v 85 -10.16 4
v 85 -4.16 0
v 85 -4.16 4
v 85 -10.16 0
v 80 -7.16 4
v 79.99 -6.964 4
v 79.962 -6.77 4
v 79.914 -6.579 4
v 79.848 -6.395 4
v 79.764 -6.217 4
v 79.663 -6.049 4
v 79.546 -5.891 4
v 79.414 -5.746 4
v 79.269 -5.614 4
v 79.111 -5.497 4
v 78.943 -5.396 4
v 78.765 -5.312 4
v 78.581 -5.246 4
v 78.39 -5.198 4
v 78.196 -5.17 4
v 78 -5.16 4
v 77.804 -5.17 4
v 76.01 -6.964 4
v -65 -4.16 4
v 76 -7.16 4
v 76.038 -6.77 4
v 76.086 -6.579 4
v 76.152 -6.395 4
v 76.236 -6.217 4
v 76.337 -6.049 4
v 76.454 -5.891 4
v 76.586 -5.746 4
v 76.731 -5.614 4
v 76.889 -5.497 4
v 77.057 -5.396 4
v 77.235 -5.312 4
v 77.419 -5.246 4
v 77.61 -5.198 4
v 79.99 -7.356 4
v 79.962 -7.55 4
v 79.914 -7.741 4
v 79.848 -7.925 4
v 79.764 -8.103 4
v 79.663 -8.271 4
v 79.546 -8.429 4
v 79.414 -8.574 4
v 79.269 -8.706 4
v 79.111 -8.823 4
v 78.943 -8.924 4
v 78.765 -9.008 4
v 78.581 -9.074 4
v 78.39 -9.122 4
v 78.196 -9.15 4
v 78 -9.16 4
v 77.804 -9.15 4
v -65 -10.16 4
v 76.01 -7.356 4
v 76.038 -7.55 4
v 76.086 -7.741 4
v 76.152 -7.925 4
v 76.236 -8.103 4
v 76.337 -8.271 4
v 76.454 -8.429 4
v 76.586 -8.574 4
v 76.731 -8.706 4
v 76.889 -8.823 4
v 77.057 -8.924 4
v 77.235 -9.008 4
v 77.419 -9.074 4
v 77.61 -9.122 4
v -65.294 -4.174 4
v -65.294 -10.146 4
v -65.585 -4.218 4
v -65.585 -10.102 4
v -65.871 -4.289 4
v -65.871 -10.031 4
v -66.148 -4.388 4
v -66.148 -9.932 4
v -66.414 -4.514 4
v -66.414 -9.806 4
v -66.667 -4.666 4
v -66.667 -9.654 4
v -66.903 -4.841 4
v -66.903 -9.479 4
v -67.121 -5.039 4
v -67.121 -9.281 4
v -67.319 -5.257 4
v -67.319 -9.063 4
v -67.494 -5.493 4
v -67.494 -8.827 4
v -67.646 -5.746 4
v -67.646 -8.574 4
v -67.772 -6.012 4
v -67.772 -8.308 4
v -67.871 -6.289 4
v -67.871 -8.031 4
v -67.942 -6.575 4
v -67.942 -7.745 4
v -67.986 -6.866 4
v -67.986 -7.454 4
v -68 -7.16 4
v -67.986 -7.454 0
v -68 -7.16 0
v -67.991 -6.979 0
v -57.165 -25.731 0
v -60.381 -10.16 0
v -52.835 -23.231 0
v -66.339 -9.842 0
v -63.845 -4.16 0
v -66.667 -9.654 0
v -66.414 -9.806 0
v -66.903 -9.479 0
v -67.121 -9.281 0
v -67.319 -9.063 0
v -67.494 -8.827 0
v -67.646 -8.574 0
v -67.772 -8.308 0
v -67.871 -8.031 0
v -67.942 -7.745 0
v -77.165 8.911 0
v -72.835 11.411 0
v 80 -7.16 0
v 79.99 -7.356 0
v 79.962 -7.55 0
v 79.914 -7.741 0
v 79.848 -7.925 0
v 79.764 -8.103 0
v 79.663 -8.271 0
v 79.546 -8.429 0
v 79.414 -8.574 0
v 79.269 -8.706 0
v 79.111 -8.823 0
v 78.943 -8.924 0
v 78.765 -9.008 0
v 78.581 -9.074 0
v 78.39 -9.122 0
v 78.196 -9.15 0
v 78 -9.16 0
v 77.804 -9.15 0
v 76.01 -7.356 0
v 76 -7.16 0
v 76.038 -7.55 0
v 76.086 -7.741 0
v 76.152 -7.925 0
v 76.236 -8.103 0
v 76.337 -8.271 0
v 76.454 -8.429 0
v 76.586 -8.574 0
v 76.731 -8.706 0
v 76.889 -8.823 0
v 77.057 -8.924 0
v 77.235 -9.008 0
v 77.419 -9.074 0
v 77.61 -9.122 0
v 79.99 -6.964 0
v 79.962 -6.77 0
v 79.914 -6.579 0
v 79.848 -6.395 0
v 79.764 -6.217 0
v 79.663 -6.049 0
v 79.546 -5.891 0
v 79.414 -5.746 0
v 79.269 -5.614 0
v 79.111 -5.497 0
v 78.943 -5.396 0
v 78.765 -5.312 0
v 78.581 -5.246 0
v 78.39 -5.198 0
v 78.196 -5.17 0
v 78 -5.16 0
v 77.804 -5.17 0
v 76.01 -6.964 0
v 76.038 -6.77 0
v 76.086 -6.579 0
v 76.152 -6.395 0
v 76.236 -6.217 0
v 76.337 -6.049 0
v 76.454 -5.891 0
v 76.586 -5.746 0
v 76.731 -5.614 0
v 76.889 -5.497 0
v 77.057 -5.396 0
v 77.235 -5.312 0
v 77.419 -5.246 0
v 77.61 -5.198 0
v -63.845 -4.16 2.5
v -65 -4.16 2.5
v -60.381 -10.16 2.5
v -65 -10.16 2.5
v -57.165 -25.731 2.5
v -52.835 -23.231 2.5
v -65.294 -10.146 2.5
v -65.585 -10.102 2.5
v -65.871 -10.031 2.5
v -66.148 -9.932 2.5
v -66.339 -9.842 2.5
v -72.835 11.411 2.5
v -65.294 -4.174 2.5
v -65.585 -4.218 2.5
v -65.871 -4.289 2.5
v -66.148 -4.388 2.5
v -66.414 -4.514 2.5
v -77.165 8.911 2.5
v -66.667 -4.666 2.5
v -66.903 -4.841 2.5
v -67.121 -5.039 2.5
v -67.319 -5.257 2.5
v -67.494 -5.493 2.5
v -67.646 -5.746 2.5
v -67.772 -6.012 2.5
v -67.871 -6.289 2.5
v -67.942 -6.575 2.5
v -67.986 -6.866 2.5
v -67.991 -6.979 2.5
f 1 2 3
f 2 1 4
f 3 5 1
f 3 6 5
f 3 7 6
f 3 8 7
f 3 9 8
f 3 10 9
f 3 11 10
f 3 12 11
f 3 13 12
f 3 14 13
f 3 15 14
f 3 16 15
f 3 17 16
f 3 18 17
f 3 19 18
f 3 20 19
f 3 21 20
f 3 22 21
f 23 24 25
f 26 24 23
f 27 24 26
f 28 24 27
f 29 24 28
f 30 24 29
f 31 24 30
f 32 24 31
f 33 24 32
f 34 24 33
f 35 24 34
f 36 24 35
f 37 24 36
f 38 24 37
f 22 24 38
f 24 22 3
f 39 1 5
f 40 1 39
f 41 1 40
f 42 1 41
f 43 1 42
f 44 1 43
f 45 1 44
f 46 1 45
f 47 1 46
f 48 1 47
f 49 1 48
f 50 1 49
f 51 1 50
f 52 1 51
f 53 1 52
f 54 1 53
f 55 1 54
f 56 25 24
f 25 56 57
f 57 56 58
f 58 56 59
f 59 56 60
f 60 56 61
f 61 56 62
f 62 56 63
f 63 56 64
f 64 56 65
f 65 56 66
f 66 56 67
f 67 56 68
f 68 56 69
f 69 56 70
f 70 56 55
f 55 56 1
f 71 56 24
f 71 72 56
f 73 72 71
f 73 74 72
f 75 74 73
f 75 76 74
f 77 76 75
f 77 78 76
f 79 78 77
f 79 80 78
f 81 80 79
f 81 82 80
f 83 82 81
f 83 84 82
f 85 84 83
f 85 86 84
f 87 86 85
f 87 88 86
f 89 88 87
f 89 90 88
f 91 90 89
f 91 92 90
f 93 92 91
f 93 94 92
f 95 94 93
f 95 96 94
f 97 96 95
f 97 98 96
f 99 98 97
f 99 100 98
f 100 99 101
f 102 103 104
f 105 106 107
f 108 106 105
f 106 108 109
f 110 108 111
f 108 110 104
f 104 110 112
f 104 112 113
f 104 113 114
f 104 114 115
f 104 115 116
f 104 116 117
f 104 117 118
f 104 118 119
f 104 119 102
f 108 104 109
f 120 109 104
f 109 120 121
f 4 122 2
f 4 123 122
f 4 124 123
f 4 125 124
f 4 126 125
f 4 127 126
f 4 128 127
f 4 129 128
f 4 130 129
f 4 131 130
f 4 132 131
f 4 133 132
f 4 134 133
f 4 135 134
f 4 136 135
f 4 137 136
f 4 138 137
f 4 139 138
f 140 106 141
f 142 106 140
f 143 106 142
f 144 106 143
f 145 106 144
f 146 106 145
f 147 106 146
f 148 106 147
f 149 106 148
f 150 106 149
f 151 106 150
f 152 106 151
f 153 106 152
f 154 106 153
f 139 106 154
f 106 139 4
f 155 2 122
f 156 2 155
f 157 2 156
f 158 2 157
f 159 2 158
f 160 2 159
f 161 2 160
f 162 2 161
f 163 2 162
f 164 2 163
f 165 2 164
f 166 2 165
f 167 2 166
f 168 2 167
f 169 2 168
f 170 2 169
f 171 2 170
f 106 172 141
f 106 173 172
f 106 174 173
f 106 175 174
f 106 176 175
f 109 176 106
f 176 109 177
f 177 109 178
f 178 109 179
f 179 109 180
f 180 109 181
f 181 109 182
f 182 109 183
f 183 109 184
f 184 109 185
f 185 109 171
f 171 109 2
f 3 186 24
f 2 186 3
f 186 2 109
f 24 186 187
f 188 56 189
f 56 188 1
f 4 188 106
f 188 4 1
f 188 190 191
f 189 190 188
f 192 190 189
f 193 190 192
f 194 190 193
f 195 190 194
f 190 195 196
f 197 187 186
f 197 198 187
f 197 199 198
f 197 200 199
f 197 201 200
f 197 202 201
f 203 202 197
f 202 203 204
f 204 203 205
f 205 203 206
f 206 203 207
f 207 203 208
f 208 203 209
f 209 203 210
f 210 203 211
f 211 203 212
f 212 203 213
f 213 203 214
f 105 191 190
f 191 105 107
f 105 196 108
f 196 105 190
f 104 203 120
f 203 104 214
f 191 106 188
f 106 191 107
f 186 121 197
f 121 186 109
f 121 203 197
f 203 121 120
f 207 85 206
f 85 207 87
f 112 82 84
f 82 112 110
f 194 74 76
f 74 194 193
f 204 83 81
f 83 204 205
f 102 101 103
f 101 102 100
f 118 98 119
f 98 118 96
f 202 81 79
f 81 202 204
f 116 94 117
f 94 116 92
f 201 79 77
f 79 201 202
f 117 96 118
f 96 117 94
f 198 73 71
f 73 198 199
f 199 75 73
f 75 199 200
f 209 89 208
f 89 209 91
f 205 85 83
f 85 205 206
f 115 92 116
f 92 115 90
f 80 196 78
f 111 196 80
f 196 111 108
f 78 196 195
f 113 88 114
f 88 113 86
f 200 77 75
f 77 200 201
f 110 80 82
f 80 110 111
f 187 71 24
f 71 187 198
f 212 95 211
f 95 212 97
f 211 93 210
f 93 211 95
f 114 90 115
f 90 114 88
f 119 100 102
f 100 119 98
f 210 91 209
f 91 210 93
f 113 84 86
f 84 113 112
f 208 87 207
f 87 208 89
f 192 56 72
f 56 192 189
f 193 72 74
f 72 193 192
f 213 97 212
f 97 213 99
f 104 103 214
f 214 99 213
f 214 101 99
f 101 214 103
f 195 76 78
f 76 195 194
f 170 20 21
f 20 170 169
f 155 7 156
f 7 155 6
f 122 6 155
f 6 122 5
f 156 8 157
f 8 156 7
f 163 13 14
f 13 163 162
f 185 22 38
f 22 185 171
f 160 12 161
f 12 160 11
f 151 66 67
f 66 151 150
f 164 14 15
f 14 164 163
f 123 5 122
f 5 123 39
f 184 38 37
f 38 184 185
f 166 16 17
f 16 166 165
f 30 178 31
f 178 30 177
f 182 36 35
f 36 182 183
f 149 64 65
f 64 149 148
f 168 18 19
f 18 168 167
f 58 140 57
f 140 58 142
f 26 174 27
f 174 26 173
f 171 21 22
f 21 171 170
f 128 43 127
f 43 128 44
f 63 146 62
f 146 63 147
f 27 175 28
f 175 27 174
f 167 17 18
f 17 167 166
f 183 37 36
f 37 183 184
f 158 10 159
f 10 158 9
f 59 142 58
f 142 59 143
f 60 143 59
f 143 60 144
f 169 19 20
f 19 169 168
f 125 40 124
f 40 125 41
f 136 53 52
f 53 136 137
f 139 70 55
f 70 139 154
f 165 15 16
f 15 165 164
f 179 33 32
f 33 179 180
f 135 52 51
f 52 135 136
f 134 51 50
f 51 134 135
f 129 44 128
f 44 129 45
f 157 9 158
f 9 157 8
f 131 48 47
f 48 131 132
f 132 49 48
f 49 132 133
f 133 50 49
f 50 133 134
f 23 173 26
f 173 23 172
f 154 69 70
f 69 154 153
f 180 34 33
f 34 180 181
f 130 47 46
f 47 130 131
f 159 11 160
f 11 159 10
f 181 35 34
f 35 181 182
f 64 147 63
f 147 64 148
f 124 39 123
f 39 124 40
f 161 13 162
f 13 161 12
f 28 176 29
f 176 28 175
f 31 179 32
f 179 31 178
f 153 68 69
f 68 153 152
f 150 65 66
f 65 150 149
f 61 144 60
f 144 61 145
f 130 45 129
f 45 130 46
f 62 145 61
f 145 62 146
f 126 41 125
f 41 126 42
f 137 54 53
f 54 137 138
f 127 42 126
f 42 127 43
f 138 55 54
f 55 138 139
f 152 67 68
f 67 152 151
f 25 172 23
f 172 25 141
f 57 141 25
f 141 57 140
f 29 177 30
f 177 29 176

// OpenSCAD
// L-shaped (hockey-stick) cell spreader, printed lying flat (z=0 is the bed side)
$fn = 64;

// Handle (long bar): x = 0 to 150, y = -3 to 3, z = 0 to 4
handle_len   = 150;   // mm, x = 0 to 150
handle_w     = 6;     // mm, y = -3 to 3
handle_t     = 4;     // mm, z = 0 to 4

// Spreading foot (thin bar, 120° CCW from +X)
foot_len     = 40;    // mm, along its centre line
foot_w       = 5;     // mm, transverse width
foot_t       = 2.5;   // mm, z = 0 to 2.5 (smooth bed side)
foot_angle   = 120;   // deg, CCW from +X, seen from above

// Round boss joining the bars at the origin
boss_d       = 6;     // mm diameter
boss_t       = 4;     // mm tall

// Hanging hole through the handle
hole_d       = 4;     // mm diameter
hole_x       = 143;   // mm, centre x position
hole_y       = 0;     // mm, centre y position

// ---- Handle: x 0..150, y -3..3, z 0..4 (origin at the joint) ----
module handle() { translate([0, -handle_w/2, 0])
    cube([handle_len, handle_w, handle_t]); }

// ---- Spreading foot: 40 mm bar, 120° CCW, z 0..2.5 ----
// Local frame: +x_local = 120° direction, +y_local = 120°+90° (transverse)
module foot() { rotate([0, 0, foot_angle])
    translate([-foot_len/2, -foot_w/2, 0])
    cube([foot_len, foot_w, foot_t]); }

// ---- Round boss at the origin ----
module boss() { cylinder(h = boss_t, d = boss_d); }

// ---- Hanging hole through the handle (extends past faces) ----
module hole() { translate([hole_x, hole_y, -1])
    cylinder(h = handle_t + 2, d = hole_d); }

// ---- Centring offsets so the part is centred on the origin in X and Y ----
// Handle spans x 0..150, y -3..3.
// Foot (120°) spans x -20..0, y 0..17.32.
// Union: x -20..150, y -3..17.32  ->  centre (65, 7.16)
cx = 65;
cy = 7.16;

// ---- Assemble: union of bars + boss, subtract hole, then centre on origin ----
translate([-cx, -cy, 0])
difference() {
    union() {
        handle();
        foot();
        boss();
    }
    hole();
}
